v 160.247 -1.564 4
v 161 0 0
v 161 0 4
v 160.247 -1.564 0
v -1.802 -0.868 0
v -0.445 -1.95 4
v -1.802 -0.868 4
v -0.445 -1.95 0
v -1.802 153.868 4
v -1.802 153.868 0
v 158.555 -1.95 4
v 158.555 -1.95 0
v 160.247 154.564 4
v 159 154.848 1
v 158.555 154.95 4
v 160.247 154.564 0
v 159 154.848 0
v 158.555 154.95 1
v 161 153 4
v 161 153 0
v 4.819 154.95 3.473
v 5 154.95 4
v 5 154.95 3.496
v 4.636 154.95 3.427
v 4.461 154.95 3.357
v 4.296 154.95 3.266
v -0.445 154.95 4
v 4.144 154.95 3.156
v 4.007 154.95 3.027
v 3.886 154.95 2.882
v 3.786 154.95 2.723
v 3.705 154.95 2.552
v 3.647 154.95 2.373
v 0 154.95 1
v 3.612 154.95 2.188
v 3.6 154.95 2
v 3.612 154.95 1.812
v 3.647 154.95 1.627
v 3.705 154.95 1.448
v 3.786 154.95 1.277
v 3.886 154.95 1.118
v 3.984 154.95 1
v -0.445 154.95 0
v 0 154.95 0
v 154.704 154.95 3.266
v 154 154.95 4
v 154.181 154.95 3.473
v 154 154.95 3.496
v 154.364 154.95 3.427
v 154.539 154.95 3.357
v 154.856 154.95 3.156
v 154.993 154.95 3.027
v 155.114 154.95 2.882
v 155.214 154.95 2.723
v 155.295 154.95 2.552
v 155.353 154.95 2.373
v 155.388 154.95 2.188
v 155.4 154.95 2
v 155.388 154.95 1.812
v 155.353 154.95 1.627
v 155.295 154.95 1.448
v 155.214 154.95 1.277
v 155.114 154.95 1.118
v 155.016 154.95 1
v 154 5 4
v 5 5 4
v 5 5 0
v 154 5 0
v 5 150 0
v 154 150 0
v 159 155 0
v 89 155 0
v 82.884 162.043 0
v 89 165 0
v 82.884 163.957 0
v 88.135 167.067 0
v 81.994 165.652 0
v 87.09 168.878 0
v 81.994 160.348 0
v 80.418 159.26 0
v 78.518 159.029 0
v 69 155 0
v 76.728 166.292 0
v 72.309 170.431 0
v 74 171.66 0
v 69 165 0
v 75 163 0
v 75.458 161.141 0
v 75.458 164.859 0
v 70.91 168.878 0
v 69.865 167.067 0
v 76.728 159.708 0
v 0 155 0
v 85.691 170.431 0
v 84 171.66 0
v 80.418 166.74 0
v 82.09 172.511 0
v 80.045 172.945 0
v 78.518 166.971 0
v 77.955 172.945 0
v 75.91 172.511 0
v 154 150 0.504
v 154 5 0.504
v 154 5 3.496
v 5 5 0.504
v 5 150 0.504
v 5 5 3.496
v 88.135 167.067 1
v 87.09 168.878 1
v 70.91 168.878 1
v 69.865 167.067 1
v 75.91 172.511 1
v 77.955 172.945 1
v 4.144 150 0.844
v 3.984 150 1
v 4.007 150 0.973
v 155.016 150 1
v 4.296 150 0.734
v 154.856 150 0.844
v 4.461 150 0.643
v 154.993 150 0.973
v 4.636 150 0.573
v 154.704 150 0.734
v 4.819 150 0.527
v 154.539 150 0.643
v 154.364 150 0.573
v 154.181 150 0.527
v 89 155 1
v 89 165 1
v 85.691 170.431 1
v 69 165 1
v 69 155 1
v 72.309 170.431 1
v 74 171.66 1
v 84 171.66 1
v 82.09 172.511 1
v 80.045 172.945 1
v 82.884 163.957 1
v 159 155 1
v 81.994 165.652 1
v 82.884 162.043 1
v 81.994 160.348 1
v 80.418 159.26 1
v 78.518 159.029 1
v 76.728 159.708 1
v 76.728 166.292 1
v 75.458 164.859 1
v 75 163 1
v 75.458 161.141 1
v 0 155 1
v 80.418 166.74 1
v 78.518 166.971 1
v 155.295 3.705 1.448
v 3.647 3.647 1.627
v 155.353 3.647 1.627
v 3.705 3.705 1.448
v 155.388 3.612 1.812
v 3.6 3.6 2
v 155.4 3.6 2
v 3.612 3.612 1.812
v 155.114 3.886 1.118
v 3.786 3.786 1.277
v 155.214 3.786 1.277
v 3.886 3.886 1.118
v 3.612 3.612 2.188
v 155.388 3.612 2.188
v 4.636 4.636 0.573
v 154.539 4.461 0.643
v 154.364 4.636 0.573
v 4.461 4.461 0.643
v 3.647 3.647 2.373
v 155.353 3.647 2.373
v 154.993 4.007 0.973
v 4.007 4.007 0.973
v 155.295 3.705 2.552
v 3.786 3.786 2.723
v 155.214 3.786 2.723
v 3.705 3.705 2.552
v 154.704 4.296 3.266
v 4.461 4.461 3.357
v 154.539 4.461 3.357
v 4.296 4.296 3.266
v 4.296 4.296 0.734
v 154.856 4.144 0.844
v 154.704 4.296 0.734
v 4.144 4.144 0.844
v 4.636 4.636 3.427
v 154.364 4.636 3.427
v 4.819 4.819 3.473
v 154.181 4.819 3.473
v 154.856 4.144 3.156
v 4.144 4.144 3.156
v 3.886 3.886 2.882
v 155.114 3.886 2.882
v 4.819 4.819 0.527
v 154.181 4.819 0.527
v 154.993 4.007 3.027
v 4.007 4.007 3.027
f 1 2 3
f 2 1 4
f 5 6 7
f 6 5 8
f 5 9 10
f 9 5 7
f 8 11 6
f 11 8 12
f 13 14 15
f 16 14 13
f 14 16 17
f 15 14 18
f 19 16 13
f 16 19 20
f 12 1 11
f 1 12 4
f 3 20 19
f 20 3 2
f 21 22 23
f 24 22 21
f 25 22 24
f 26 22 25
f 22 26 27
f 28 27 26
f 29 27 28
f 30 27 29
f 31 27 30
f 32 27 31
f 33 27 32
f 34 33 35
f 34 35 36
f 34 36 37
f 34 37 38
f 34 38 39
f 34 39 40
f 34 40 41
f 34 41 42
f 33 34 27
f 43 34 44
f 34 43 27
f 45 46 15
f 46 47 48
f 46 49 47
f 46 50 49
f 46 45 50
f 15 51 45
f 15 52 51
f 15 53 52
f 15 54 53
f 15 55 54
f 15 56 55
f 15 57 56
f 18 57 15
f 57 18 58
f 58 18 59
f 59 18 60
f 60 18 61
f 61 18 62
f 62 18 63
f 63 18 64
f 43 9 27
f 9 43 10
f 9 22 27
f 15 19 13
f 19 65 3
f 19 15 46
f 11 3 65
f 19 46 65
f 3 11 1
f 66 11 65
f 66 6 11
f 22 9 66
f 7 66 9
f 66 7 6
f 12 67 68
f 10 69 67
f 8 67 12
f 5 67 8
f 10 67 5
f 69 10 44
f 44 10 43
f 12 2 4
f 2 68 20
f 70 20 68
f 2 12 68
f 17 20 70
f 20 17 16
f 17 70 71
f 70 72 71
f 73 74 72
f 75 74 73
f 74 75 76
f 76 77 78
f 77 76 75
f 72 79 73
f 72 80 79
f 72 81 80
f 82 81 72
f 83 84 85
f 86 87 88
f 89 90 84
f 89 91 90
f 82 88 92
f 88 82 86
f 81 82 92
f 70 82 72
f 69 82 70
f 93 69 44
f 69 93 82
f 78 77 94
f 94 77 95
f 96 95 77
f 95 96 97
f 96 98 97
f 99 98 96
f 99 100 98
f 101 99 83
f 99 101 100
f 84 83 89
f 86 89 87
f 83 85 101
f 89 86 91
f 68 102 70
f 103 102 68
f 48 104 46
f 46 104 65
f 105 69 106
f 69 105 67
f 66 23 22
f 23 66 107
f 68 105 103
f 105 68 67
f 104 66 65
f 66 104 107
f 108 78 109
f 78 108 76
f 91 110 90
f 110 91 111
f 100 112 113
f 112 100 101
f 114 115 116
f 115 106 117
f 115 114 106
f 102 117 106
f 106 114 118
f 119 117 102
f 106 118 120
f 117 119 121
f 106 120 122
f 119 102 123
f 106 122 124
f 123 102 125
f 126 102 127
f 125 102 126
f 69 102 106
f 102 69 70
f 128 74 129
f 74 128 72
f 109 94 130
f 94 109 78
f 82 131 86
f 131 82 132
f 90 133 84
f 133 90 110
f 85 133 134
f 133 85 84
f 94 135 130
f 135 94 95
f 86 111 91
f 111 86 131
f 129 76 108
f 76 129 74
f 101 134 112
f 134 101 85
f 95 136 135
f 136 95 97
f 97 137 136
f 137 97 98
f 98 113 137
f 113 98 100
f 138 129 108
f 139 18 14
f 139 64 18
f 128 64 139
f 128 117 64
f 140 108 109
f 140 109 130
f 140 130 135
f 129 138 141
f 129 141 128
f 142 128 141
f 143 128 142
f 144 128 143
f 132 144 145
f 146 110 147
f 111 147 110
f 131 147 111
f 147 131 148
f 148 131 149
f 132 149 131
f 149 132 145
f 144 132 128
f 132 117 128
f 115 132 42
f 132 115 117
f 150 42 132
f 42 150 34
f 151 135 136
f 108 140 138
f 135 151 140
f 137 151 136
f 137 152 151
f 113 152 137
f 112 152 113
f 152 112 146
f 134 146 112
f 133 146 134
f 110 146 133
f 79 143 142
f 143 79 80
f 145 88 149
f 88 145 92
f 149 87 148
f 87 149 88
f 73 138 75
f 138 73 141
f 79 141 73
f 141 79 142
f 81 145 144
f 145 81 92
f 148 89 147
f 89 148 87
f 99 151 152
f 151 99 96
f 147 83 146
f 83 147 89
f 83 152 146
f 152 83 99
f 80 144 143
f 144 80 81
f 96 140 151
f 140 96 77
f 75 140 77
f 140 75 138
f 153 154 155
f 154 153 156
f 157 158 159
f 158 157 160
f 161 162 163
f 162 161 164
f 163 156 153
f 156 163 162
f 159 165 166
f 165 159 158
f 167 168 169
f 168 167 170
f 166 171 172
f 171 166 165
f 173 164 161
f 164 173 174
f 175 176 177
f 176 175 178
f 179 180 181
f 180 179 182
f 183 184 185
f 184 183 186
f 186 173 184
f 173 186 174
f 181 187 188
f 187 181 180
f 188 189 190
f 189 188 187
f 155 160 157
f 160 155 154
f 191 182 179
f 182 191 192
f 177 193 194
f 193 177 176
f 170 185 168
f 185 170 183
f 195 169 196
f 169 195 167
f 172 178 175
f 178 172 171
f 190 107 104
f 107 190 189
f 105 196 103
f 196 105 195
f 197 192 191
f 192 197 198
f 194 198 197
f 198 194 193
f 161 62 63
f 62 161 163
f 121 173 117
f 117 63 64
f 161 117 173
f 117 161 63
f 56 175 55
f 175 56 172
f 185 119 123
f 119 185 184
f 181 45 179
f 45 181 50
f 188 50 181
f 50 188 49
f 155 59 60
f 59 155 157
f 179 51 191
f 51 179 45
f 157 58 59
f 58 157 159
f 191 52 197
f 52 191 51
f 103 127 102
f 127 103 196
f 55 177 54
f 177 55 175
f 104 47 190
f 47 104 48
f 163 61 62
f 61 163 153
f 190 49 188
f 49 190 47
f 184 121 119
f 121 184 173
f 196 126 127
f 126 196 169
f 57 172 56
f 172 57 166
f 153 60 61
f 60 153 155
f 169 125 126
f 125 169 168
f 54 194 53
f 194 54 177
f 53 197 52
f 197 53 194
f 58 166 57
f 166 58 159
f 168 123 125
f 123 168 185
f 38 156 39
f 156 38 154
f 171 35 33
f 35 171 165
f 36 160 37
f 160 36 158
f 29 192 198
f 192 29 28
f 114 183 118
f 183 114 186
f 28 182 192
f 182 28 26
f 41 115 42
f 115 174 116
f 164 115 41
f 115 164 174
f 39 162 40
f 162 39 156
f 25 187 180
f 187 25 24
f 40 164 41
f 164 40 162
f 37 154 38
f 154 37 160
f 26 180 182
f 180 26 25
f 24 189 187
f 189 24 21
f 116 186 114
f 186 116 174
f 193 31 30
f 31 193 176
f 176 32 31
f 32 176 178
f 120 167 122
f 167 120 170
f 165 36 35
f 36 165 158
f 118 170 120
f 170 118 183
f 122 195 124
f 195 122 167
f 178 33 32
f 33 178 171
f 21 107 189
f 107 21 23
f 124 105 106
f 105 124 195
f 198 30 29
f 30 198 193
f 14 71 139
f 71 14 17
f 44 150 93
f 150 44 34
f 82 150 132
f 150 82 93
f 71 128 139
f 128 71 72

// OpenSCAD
/********************************************************************************************************
P-Plate and L-Plate Holder v1.0 by Mike Thompson 3/1/2015, Thingiverse: mike_linus

The Plate Holder is designed to hold the standard 150mm x 150mm Australian L or P plates. 

The key advantage is the ability to slide the plate in and out without having to remove the mounting mechanism.  This is particularly handy when frequently changing plates between drivers.

The attachment locations and hole size are customisable for various suction cup or hook sizes and placements.
********************************************************************************************************/

/**************************************************************************
Enter the values corresponding to your tray requirements in this section
***************************************************************************/

/* [Attachment Options] */


//The radius of the attachment hole
sucker_hole_radius=4;
//Top Attachment
tsucker="include";//[include,exclude]
//Left Attachment
lsucker="exclude";//[include,exclude]
//Right Attachment
rsucker="exclude";//[include,exclude]
//Bottom Attachment
bsucker="exclude";//[include,exclude]

module holder()
{
	difference()
	{
		hull()
		{
			cylinder(r=2, h=4);
			translate([159,0,0])cylinder(r=2, h=4);
			translate([0,153,0])cylinder(r=2, h=4);
			translate([159,153,0])cylinder(r=2, h=4);
		}
		translate([5,5,0])cube([149,151,6]);	
	}
}

module sucker()
{
	difference()
	{	
		hull()
		{
			cylinder(r=10,h=1);
			translate([-10,-2,0])cube([20,15,1]);
		}
		cylinder(r=sucker_hole_radius,h=1);
	}
}

module slots()
{
	translate([5.1,158,2])rotate([90,180,0])cylinder(r=1.5,h=153,$fn=50);
	translate([5,5.1,2])rotate([0,90,0])rotate([0,0,-90])cylinder(r=1.5,h=149,$fn=50);
	translate([153.9,158,2])mirror(0,0,1)rotate([90,180,0])cylinder(r=1.5,h=153,$fn=50);
	intersection()
	{
		translate([4,5.1,2])rotate([0,90,0])rotate([0,0,-90])cylinder(r=1.5,h=152,$fn=50);
		translate([153.9,156,2])mirror(0,0,1)rotate([90,180,0])cylinder(r=1.5,h=153,$fn=50);
	}
	intersection()
	{
		translate([5.1,155,2])rotate([90,180,0])cylinder(r=1.5,h=152,$fn=50);
		translate([3,5.1,2])rotate([0,90,0])rotate([0,0,-90])cylinder(r=1.5,h=153,$fn=50);
	}

}

module build()
{
	difference()
	{
		union()
		{
			holder();
			if (bsucker=="include")
			{
				translate([79,-10,0])sucker();
			}
			if (rsucker=="include")
			{
				translate([169,141,0])rotate([0,0,90])sucker();
			}
			if (lsucker=="include")
			{
				translate([-10,141,0])rotate([0,0,-90])sucker();
			}
			if (tsucker=="include")
			{
				translate([79,163,0])rotate([0,0,180])sucker();
			}
		}
		slots();
	}
	translate([0,150,0])cube([159,5,1]);	
}

build();
